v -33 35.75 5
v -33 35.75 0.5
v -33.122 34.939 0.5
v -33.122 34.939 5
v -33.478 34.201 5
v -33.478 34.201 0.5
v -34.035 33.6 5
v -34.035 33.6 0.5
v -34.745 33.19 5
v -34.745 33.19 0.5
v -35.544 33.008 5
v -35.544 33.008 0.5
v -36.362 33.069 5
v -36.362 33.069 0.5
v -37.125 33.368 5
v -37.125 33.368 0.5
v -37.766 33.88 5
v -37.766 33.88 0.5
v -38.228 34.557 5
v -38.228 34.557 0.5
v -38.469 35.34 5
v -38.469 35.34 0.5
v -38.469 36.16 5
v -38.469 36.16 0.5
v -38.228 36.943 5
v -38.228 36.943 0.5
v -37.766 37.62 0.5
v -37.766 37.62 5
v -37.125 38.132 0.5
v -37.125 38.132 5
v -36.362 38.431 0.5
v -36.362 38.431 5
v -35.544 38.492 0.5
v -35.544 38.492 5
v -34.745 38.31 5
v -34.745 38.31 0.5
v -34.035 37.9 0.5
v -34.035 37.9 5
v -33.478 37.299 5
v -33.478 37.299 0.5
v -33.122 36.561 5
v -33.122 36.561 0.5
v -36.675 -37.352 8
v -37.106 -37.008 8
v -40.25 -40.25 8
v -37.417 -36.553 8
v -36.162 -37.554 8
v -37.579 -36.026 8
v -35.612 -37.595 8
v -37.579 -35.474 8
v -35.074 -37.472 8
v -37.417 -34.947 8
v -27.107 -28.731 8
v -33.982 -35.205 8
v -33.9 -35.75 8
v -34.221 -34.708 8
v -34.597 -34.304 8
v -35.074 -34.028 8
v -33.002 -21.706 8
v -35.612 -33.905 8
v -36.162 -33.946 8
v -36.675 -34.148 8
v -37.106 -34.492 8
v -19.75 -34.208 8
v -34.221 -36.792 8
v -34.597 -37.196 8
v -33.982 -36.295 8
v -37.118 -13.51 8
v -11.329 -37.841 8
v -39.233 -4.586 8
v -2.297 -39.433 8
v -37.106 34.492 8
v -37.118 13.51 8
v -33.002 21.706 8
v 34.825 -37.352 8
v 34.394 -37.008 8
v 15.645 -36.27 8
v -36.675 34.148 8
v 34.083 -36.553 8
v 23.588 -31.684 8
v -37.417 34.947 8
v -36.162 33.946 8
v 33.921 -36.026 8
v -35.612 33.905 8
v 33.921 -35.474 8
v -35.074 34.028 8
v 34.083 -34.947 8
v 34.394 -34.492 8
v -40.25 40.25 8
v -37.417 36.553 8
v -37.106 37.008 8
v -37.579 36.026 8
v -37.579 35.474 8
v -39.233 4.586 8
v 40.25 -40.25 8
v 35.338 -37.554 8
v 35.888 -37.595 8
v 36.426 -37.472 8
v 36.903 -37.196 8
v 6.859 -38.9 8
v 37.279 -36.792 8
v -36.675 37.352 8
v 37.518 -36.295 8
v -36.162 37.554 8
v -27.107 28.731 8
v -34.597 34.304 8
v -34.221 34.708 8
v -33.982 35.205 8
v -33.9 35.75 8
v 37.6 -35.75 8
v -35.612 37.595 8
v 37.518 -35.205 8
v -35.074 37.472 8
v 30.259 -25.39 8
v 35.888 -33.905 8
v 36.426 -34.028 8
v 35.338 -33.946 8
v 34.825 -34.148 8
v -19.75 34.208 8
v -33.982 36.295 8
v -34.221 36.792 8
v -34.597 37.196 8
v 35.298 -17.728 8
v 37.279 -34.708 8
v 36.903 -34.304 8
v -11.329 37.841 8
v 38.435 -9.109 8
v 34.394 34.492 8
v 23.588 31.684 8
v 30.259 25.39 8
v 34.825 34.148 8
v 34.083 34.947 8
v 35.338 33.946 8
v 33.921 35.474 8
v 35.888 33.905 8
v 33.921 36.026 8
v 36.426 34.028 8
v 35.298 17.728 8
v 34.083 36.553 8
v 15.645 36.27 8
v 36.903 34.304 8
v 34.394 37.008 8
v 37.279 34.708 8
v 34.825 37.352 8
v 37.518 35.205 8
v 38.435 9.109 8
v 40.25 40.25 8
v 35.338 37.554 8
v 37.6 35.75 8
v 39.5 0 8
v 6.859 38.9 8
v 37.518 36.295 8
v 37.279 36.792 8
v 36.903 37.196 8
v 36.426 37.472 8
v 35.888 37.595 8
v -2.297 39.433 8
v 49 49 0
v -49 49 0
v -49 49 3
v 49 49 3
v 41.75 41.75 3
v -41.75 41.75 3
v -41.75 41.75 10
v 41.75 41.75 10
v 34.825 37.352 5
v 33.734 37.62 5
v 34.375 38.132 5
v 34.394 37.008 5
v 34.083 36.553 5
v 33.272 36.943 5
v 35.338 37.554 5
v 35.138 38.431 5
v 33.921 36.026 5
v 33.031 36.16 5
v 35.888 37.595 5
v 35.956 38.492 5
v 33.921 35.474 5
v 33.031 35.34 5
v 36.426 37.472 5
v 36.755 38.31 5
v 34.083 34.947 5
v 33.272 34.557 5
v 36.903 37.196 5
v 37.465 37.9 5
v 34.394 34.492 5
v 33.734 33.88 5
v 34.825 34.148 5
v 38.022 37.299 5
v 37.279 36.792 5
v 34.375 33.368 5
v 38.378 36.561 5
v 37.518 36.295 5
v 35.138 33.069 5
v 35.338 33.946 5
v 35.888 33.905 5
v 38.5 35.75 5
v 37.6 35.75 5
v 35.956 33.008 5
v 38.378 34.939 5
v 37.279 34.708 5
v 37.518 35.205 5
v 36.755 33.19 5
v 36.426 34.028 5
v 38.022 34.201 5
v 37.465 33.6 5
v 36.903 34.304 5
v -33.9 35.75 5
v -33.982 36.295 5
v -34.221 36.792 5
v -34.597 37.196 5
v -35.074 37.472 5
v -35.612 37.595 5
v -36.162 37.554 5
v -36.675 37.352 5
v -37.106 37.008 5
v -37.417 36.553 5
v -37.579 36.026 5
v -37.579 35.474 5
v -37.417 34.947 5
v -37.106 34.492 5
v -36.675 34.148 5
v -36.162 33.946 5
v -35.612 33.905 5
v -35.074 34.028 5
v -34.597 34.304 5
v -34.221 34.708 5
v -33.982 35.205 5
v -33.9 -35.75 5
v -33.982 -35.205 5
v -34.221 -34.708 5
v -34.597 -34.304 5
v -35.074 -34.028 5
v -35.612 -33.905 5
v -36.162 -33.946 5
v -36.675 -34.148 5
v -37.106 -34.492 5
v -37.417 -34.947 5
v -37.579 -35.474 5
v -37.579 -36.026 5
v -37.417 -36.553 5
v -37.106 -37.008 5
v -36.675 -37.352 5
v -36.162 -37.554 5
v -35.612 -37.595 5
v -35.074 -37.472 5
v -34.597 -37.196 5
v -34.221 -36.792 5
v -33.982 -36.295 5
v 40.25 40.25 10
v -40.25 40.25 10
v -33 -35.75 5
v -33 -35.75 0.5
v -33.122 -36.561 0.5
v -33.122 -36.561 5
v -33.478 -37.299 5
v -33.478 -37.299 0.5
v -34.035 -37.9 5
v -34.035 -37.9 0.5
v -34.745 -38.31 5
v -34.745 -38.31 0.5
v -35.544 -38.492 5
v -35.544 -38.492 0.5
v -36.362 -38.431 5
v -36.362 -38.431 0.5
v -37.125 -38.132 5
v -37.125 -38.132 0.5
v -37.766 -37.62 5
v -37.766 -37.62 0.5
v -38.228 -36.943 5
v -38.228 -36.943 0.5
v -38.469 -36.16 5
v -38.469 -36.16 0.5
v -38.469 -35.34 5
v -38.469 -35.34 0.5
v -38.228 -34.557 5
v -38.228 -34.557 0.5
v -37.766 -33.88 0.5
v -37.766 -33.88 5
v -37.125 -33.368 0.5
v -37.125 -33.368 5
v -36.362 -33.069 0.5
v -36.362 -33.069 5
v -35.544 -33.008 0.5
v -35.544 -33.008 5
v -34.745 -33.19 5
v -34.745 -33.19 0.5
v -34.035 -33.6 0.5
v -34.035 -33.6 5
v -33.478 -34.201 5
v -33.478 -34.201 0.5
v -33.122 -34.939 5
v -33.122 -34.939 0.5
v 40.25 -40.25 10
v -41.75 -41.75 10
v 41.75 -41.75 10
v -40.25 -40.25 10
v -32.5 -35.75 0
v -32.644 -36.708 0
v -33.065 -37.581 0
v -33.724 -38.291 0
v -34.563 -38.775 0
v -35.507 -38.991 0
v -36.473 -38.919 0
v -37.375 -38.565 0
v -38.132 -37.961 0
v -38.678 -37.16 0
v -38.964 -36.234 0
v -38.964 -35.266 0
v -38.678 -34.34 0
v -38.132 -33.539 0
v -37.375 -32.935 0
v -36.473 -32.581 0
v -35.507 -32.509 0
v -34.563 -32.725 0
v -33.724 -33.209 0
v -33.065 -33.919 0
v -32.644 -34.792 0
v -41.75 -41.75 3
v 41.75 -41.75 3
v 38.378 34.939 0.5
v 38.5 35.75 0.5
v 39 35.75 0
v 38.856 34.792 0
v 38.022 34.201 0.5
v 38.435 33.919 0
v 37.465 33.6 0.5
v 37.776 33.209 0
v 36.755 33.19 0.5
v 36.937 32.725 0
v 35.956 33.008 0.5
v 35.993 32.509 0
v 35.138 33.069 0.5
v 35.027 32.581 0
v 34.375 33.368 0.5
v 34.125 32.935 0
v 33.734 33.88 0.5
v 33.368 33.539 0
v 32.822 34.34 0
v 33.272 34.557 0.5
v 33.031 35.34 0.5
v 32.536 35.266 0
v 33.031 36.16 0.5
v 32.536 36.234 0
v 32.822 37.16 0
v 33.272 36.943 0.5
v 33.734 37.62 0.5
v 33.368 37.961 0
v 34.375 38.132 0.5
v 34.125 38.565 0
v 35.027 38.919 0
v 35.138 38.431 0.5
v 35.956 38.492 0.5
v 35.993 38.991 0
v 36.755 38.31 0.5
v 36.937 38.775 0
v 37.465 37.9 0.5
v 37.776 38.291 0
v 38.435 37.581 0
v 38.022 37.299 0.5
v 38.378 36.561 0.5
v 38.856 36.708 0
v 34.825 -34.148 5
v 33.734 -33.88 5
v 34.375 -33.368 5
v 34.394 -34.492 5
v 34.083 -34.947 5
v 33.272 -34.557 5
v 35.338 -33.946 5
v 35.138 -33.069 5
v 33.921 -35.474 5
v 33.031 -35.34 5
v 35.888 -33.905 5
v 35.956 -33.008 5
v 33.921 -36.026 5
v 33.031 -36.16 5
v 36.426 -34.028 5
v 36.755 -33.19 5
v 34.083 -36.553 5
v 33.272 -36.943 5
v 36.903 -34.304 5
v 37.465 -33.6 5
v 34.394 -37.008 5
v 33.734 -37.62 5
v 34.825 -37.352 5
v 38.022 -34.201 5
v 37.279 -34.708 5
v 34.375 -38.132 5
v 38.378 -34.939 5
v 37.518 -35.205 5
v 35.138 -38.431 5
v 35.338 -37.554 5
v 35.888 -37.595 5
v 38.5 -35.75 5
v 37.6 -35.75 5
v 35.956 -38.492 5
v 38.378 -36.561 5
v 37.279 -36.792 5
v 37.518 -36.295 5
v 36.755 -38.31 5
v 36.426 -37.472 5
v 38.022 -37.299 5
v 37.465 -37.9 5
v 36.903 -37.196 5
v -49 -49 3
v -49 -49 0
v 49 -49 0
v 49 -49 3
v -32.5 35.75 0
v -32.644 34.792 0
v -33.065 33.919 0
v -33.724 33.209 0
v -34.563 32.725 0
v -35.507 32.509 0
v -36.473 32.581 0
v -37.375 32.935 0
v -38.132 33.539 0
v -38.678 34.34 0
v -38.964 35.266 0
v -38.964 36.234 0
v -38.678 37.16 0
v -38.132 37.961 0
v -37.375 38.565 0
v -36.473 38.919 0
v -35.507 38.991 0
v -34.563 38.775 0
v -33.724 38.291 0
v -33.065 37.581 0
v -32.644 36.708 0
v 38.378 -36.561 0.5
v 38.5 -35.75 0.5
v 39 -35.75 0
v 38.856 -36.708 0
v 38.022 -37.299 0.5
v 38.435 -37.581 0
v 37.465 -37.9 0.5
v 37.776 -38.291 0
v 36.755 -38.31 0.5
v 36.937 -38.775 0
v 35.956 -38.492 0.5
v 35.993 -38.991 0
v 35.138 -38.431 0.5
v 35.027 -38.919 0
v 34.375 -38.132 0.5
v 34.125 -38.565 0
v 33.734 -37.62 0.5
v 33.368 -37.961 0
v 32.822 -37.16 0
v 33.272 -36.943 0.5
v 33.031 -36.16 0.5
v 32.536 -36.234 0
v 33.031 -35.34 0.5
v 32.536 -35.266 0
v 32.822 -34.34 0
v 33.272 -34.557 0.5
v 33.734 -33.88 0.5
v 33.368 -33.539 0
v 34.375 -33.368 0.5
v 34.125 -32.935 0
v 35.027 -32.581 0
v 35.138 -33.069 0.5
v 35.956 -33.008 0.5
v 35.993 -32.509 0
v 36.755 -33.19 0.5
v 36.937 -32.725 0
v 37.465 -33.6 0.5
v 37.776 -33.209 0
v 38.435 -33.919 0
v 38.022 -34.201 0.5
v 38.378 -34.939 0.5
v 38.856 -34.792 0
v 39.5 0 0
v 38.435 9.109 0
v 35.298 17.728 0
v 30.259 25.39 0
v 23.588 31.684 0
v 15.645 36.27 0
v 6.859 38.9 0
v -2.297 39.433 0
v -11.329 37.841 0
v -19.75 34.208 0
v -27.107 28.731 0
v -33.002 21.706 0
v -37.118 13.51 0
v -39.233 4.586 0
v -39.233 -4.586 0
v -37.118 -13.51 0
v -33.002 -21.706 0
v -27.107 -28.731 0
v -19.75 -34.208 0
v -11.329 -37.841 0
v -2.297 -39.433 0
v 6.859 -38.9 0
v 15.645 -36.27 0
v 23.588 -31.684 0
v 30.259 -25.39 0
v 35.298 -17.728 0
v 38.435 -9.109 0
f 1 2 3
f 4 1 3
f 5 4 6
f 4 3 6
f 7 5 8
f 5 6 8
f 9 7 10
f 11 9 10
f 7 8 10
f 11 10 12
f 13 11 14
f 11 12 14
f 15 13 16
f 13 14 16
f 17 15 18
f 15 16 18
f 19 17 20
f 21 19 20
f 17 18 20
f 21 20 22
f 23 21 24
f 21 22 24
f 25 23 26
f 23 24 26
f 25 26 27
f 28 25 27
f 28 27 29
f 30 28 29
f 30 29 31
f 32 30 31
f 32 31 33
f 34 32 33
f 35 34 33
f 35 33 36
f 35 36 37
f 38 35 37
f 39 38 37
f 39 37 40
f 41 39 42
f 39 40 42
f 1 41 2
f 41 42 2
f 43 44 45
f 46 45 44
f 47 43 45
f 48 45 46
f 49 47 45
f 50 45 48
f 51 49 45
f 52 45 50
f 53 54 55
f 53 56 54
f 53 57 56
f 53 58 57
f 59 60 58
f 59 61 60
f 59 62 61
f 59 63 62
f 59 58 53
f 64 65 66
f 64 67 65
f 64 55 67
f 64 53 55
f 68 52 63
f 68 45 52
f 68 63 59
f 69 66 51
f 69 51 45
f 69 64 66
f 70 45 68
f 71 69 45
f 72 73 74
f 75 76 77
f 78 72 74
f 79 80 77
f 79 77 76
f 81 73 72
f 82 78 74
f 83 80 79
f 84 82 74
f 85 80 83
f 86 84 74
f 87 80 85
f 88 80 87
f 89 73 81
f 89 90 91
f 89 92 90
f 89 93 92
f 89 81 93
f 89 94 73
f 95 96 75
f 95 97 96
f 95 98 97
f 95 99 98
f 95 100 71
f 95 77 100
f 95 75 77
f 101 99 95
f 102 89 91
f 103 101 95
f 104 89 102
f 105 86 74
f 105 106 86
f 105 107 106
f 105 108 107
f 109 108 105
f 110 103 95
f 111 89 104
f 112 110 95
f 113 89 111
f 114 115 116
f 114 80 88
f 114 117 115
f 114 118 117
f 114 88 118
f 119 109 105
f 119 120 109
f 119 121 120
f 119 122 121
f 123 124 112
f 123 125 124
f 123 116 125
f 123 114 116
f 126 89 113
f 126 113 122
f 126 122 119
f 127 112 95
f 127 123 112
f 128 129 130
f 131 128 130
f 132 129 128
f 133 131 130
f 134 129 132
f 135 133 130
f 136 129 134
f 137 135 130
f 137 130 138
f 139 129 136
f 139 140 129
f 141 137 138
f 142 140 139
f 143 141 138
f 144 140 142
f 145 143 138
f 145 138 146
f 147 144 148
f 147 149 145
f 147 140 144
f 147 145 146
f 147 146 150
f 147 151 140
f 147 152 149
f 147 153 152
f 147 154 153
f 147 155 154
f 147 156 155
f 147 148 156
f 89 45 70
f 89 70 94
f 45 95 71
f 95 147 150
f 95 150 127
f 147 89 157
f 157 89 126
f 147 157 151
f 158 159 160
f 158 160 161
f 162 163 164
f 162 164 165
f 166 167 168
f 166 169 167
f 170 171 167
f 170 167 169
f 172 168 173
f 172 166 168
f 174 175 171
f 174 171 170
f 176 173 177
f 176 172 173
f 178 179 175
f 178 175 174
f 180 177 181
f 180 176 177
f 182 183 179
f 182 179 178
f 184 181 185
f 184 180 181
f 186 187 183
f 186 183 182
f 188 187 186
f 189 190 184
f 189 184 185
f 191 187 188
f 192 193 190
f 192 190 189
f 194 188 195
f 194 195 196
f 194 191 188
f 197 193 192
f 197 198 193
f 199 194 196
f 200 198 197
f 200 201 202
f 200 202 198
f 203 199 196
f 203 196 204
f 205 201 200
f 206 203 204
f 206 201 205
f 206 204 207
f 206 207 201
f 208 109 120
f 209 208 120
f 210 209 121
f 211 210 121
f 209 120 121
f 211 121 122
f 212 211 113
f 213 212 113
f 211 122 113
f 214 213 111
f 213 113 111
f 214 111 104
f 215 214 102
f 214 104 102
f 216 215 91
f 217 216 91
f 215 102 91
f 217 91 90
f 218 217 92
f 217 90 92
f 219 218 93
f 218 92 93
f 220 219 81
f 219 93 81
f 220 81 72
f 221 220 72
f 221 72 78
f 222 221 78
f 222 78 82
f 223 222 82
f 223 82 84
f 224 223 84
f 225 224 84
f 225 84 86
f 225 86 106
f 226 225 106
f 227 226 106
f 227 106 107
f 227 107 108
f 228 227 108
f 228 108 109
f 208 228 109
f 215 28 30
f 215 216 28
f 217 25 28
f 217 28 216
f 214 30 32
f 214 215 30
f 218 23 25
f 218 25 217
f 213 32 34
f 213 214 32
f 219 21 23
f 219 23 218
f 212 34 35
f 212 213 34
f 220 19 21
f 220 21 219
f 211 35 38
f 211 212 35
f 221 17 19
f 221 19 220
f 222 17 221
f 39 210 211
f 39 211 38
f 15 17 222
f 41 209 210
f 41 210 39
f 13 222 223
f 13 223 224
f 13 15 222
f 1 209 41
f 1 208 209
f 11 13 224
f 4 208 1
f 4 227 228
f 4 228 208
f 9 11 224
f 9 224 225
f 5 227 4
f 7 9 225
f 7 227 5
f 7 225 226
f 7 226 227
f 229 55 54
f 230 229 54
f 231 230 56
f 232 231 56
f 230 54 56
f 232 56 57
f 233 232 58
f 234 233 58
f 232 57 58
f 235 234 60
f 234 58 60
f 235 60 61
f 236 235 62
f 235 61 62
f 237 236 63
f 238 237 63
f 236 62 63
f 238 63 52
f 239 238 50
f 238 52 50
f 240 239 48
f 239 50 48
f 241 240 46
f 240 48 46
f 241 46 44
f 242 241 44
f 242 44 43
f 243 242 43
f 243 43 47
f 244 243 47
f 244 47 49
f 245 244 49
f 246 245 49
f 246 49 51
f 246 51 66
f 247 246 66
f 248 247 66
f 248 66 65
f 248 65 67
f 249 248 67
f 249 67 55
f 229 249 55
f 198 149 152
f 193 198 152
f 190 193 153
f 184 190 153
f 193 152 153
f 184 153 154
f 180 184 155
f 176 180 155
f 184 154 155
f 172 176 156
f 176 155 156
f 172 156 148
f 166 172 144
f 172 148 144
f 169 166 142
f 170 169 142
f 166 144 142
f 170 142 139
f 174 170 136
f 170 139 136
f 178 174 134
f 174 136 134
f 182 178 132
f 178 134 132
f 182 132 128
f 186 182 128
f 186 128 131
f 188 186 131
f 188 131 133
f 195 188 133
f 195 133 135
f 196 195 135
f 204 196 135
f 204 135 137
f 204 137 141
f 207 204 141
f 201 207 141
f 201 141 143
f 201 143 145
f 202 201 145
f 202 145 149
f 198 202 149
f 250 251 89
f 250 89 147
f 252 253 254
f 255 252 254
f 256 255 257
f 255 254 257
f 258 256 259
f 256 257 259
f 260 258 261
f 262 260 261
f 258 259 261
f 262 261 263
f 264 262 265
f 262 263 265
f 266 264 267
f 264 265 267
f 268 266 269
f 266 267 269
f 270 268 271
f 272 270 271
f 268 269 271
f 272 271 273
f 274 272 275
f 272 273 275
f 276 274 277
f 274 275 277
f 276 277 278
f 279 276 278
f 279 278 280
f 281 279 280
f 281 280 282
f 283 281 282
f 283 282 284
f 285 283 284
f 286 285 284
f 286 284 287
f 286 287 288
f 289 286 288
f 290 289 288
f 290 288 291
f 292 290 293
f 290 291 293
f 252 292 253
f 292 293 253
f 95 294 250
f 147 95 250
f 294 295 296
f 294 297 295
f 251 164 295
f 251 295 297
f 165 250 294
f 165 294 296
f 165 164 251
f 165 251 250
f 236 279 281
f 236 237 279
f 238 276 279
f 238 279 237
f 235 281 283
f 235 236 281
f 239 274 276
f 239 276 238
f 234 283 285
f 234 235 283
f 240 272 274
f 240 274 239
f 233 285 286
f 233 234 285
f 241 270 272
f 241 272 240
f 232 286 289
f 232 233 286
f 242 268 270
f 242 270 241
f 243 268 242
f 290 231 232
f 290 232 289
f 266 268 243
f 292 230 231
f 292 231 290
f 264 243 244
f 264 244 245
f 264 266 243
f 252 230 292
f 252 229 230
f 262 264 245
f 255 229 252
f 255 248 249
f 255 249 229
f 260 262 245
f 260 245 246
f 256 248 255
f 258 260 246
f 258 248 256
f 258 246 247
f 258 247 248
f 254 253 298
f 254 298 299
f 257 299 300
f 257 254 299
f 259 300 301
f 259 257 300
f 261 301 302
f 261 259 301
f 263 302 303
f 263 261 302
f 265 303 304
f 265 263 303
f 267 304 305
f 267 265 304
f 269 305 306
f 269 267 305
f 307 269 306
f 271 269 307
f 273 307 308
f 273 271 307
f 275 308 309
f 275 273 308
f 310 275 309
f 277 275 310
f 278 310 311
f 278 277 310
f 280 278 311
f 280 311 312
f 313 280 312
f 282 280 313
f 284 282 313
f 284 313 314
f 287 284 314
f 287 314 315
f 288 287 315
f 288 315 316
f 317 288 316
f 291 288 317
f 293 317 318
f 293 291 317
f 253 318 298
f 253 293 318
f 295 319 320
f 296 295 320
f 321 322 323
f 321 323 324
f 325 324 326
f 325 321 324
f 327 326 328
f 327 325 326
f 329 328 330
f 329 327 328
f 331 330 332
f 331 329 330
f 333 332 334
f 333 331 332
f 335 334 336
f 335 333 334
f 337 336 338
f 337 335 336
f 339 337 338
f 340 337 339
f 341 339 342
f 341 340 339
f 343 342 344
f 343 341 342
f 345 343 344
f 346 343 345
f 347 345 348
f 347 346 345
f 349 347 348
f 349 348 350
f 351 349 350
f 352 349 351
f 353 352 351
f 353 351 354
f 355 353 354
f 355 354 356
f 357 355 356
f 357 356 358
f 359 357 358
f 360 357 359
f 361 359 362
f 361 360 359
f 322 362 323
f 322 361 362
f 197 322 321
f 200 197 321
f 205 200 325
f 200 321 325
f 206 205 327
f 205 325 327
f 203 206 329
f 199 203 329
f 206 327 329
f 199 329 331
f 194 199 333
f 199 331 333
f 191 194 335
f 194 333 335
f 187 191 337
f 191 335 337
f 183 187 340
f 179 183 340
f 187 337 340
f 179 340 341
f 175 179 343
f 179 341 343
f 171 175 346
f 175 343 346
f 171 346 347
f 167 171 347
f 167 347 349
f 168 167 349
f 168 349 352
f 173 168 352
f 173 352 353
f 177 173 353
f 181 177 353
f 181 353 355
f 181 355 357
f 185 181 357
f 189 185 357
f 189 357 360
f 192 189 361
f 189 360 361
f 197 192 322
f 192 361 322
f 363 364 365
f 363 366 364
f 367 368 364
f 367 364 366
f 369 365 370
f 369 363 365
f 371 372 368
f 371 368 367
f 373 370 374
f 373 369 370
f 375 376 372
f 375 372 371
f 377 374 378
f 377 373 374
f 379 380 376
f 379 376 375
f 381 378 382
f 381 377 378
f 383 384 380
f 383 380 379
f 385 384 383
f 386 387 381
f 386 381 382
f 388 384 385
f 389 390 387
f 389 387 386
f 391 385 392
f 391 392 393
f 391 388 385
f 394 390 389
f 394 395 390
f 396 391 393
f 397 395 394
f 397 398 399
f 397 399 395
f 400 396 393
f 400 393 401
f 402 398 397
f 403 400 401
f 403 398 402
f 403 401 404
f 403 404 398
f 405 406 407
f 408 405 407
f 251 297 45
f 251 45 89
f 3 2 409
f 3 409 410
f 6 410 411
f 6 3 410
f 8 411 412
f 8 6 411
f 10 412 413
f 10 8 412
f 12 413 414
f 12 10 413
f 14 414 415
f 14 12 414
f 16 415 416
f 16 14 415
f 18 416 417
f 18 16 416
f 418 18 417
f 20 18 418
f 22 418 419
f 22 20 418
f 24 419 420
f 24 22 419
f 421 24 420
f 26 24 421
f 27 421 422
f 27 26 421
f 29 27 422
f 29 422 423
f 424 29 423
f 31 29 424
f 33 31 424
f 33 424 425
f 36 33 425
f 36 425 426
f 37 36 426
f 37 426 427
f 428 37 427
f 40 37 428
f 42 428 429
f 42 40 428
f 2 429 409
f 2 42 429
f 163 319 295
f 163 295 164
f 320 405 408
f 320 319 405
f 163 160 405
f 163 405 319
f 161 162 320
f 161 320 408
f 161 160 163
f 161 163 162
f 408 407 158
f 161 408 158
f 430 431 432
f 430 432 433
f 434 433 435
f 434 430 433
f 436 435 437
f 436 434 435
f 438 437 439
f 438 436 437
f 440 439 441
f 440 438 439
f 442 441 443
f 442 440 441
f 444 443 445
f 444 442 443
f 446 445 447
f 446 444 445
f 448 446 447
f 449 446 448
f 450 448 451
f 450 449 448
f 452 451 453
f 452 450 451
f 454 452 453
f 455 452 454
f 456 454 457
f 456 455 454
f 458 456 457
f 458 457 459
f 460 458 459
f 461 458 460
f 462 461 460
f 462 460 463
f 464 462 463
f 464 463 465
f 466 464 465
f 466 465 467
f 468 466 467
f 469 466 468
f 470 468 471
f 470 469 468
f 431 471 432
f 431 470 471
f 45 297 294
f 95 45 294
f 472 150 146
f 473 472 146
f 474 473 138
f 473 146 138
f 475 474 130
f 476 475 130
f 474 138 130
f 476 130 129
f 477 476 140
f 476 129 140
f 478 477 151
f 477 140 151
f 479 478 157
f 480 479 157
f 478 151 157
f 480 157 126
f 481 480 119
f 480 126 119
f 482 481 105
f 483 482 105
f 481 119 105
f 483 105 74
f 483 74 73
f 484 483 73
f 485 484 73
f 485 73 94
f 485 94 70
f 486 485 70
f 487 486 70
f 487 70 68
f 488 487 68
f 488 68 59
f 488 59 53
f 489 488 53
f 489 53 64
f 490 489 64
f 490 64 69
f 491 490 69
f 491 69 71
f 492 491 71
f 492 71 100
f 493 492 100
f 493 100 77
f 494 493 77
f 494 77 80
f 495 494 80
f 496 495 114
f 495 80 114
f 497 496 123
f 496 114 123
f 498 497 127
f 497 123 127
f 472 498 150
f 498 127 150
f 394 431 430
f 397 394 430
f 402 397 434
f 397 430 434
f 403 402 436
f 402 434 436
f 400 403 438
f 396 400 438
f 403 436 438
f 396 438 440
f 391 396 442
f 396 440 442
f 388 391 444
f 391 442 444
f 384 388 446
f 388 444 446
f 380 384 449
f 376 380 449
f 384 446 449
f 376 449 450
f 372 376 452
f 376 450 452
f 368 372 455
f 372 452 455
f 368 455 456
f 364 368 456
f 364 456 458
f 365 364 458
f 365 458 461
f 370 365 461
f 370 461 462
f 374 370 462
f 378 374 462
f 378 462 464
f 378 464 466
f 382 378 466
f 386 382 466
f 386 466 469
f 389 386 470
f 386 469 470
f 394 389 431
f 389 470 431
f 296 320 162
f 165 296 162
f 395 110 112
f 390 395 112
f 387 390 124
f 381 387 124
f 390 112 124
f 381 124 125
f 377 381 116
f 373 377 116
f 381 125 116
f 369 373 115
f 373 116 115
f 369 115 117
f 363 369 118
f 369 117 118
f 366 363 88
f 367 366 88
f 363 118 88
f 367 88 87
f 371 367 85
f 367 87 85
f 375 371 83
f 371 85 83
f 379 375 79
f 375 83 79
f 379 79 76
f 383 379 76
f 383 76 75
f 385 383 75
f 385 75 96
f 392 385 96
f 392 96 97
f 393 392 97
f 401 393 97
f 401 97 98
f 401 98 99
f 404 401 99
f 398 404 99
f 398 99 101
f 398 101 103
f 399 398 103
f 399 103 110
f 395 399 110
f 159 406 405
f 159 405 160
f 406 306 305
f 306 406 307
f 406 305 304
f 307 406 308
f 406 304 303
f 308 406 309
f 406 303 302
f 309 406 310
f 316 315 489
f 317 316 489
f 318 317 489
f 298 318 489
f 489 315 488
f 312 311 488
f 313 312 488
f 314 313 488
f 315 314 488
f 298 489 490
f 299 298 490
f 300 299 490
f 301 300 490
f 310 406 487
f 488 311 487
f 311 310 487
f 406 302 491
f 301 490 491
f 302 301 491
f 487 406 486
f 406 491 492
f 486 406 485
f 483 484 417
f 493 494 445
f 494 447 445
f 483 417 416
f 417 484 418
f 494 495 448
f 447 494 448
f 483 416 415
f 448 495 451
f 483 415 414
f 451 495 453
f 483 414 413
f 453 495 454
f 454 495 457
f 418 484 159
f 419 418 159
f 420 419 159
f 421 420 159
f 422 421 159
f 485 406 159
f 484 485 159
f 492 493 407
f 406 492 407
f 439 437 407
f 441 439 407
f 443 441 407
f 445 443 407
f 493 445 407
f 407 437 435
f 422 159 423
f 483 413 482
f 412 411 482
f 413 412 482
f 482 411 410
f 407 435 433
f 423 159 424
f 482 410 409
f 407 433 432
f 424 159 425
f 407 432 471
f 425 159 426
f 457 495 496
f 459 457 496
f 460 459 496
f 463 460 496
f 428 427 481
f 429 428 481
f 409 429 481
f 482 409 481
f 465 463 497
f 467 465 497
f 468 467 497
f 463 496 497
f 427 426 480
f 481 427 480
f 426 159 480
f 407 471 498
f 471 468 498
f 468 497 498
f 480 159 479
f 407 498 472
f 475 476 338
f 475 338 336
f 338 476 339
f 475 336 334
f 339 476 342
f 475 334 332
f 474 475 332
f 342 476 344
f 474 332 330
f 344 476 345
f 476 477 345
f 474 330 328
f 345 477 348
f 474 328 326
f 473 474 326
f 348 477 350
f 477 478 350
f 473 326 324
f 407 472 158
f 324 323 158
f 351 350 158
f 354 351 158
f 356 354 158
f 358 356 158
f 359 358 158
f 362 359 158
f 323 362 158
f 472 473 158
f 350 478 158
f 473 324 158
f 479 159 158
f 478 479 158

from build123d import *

# Parameters (mm, degrees)
SKETCH_W        = 98
SKETCH_H        = 98
PAD_DEPTH       = 3
SKETCH001_W     = 83.5
SKETCH001_H     = 83.5
PAD001_DEPTH    = 7
SKETCH002_R     = 39.5
POCKET_DEPTH    = 10
SKETCH003_W     = 80.5
SKETCH003_H     = 80.5
POCKET001_DEPTH = 2
SKETCH004_R     = 1.85
POCKET002_DEPTH = 8
SKETCH005_R     = 2.75
POCKET003_DEPTH = 5
CHAMFER_SIZE    = 0.5


with BuildPart() as part:
    # Sketch → Pad (new body)
    with BuildSketch(Plane.XY):
        Rectangle(SKETCH_W, SKETCH_H)
    extrude(amount=PAD_DEPTH)

    # Sketch001 (on Face6 of Pad) → Pad001 (join)
    with BuildSketch(Plane.XY.offset(3)):
        Rectangle(SKETCH001_W, SKETCH001_H)
    extrude(amount=PAD001_DEPTH)

    # Sketch002 (on Face11 of Pad001) → Pocket (cut)
    with BuildSketch(Plane.XY.offset(10)):
        Circle(SKETCH002_R)
    extrude(amount=-POCKET_DEPTH, mode=Mode.SUBTRACT)

    # Sketch003 (on Face12 of Pocket) → Pocket001 (cut)
    with BuildSketch(Plane.XY.offset(10)):
        Rectangle(SKETCH003_W, SKETCH003_H)
    extrude(amount=-POCKET001_DEPTH, mode=Mode.SUBTRACT)

    # Sketch004 (on Face12 of Pocket001) → Pocket002 (cut)
    with BuildSketch(Plane.XY.offset(8)):
        with Locations((-35.75, 35.75)):
            Circle(SKETCH004_R)
        with Locations((35.75, 35.75)):
            Circle(SKETCH004_R)
        with Locations((35.75, -35.75)):
            Circle(SKETCH004_R)
        with Locations((-35.75, -35.75)):
            Circle(SKETCH004_R)
    extrude(amount=-POCKET002_DEPTH, mode=Mode.SUBTRACT)

    # Sketch005 (on Face4 of Pocket002) → Pocket003 (cut)
    with BuildSketch(Plane(origin=(0, 0, 0), x_dir=(1, 0, 0), z_dir=(0, 0, -1))):
        with Locations((-35.75, 35.75)):
            Circle(SKETCH005_R)
        with Locations((35.75, 35.75)):
            Circle(SKETCH005_R)
        with Locations((35.75, -35.75)):
            Circle(SKETCH005_R)
        with Locations((-35.75, -35.75)):
            Circle(SKETCH005_R)
    extrude(amount=-POCKET003_DEPTH, mode=Mode.SUBTRACT)

    # Chamfer
    chamfer_edges = [part.edges().sort_by_distance(p)[0] for p in [
        (33, 35.75, 0),
        (33, -35.75, 0),
        (-38.5, -35.75, 0),
        (-38.5, 35.75, 0),
    ]]
    chamfer(chamfer_edges, length=CHAMFER_SIZE)


solid = part.part
